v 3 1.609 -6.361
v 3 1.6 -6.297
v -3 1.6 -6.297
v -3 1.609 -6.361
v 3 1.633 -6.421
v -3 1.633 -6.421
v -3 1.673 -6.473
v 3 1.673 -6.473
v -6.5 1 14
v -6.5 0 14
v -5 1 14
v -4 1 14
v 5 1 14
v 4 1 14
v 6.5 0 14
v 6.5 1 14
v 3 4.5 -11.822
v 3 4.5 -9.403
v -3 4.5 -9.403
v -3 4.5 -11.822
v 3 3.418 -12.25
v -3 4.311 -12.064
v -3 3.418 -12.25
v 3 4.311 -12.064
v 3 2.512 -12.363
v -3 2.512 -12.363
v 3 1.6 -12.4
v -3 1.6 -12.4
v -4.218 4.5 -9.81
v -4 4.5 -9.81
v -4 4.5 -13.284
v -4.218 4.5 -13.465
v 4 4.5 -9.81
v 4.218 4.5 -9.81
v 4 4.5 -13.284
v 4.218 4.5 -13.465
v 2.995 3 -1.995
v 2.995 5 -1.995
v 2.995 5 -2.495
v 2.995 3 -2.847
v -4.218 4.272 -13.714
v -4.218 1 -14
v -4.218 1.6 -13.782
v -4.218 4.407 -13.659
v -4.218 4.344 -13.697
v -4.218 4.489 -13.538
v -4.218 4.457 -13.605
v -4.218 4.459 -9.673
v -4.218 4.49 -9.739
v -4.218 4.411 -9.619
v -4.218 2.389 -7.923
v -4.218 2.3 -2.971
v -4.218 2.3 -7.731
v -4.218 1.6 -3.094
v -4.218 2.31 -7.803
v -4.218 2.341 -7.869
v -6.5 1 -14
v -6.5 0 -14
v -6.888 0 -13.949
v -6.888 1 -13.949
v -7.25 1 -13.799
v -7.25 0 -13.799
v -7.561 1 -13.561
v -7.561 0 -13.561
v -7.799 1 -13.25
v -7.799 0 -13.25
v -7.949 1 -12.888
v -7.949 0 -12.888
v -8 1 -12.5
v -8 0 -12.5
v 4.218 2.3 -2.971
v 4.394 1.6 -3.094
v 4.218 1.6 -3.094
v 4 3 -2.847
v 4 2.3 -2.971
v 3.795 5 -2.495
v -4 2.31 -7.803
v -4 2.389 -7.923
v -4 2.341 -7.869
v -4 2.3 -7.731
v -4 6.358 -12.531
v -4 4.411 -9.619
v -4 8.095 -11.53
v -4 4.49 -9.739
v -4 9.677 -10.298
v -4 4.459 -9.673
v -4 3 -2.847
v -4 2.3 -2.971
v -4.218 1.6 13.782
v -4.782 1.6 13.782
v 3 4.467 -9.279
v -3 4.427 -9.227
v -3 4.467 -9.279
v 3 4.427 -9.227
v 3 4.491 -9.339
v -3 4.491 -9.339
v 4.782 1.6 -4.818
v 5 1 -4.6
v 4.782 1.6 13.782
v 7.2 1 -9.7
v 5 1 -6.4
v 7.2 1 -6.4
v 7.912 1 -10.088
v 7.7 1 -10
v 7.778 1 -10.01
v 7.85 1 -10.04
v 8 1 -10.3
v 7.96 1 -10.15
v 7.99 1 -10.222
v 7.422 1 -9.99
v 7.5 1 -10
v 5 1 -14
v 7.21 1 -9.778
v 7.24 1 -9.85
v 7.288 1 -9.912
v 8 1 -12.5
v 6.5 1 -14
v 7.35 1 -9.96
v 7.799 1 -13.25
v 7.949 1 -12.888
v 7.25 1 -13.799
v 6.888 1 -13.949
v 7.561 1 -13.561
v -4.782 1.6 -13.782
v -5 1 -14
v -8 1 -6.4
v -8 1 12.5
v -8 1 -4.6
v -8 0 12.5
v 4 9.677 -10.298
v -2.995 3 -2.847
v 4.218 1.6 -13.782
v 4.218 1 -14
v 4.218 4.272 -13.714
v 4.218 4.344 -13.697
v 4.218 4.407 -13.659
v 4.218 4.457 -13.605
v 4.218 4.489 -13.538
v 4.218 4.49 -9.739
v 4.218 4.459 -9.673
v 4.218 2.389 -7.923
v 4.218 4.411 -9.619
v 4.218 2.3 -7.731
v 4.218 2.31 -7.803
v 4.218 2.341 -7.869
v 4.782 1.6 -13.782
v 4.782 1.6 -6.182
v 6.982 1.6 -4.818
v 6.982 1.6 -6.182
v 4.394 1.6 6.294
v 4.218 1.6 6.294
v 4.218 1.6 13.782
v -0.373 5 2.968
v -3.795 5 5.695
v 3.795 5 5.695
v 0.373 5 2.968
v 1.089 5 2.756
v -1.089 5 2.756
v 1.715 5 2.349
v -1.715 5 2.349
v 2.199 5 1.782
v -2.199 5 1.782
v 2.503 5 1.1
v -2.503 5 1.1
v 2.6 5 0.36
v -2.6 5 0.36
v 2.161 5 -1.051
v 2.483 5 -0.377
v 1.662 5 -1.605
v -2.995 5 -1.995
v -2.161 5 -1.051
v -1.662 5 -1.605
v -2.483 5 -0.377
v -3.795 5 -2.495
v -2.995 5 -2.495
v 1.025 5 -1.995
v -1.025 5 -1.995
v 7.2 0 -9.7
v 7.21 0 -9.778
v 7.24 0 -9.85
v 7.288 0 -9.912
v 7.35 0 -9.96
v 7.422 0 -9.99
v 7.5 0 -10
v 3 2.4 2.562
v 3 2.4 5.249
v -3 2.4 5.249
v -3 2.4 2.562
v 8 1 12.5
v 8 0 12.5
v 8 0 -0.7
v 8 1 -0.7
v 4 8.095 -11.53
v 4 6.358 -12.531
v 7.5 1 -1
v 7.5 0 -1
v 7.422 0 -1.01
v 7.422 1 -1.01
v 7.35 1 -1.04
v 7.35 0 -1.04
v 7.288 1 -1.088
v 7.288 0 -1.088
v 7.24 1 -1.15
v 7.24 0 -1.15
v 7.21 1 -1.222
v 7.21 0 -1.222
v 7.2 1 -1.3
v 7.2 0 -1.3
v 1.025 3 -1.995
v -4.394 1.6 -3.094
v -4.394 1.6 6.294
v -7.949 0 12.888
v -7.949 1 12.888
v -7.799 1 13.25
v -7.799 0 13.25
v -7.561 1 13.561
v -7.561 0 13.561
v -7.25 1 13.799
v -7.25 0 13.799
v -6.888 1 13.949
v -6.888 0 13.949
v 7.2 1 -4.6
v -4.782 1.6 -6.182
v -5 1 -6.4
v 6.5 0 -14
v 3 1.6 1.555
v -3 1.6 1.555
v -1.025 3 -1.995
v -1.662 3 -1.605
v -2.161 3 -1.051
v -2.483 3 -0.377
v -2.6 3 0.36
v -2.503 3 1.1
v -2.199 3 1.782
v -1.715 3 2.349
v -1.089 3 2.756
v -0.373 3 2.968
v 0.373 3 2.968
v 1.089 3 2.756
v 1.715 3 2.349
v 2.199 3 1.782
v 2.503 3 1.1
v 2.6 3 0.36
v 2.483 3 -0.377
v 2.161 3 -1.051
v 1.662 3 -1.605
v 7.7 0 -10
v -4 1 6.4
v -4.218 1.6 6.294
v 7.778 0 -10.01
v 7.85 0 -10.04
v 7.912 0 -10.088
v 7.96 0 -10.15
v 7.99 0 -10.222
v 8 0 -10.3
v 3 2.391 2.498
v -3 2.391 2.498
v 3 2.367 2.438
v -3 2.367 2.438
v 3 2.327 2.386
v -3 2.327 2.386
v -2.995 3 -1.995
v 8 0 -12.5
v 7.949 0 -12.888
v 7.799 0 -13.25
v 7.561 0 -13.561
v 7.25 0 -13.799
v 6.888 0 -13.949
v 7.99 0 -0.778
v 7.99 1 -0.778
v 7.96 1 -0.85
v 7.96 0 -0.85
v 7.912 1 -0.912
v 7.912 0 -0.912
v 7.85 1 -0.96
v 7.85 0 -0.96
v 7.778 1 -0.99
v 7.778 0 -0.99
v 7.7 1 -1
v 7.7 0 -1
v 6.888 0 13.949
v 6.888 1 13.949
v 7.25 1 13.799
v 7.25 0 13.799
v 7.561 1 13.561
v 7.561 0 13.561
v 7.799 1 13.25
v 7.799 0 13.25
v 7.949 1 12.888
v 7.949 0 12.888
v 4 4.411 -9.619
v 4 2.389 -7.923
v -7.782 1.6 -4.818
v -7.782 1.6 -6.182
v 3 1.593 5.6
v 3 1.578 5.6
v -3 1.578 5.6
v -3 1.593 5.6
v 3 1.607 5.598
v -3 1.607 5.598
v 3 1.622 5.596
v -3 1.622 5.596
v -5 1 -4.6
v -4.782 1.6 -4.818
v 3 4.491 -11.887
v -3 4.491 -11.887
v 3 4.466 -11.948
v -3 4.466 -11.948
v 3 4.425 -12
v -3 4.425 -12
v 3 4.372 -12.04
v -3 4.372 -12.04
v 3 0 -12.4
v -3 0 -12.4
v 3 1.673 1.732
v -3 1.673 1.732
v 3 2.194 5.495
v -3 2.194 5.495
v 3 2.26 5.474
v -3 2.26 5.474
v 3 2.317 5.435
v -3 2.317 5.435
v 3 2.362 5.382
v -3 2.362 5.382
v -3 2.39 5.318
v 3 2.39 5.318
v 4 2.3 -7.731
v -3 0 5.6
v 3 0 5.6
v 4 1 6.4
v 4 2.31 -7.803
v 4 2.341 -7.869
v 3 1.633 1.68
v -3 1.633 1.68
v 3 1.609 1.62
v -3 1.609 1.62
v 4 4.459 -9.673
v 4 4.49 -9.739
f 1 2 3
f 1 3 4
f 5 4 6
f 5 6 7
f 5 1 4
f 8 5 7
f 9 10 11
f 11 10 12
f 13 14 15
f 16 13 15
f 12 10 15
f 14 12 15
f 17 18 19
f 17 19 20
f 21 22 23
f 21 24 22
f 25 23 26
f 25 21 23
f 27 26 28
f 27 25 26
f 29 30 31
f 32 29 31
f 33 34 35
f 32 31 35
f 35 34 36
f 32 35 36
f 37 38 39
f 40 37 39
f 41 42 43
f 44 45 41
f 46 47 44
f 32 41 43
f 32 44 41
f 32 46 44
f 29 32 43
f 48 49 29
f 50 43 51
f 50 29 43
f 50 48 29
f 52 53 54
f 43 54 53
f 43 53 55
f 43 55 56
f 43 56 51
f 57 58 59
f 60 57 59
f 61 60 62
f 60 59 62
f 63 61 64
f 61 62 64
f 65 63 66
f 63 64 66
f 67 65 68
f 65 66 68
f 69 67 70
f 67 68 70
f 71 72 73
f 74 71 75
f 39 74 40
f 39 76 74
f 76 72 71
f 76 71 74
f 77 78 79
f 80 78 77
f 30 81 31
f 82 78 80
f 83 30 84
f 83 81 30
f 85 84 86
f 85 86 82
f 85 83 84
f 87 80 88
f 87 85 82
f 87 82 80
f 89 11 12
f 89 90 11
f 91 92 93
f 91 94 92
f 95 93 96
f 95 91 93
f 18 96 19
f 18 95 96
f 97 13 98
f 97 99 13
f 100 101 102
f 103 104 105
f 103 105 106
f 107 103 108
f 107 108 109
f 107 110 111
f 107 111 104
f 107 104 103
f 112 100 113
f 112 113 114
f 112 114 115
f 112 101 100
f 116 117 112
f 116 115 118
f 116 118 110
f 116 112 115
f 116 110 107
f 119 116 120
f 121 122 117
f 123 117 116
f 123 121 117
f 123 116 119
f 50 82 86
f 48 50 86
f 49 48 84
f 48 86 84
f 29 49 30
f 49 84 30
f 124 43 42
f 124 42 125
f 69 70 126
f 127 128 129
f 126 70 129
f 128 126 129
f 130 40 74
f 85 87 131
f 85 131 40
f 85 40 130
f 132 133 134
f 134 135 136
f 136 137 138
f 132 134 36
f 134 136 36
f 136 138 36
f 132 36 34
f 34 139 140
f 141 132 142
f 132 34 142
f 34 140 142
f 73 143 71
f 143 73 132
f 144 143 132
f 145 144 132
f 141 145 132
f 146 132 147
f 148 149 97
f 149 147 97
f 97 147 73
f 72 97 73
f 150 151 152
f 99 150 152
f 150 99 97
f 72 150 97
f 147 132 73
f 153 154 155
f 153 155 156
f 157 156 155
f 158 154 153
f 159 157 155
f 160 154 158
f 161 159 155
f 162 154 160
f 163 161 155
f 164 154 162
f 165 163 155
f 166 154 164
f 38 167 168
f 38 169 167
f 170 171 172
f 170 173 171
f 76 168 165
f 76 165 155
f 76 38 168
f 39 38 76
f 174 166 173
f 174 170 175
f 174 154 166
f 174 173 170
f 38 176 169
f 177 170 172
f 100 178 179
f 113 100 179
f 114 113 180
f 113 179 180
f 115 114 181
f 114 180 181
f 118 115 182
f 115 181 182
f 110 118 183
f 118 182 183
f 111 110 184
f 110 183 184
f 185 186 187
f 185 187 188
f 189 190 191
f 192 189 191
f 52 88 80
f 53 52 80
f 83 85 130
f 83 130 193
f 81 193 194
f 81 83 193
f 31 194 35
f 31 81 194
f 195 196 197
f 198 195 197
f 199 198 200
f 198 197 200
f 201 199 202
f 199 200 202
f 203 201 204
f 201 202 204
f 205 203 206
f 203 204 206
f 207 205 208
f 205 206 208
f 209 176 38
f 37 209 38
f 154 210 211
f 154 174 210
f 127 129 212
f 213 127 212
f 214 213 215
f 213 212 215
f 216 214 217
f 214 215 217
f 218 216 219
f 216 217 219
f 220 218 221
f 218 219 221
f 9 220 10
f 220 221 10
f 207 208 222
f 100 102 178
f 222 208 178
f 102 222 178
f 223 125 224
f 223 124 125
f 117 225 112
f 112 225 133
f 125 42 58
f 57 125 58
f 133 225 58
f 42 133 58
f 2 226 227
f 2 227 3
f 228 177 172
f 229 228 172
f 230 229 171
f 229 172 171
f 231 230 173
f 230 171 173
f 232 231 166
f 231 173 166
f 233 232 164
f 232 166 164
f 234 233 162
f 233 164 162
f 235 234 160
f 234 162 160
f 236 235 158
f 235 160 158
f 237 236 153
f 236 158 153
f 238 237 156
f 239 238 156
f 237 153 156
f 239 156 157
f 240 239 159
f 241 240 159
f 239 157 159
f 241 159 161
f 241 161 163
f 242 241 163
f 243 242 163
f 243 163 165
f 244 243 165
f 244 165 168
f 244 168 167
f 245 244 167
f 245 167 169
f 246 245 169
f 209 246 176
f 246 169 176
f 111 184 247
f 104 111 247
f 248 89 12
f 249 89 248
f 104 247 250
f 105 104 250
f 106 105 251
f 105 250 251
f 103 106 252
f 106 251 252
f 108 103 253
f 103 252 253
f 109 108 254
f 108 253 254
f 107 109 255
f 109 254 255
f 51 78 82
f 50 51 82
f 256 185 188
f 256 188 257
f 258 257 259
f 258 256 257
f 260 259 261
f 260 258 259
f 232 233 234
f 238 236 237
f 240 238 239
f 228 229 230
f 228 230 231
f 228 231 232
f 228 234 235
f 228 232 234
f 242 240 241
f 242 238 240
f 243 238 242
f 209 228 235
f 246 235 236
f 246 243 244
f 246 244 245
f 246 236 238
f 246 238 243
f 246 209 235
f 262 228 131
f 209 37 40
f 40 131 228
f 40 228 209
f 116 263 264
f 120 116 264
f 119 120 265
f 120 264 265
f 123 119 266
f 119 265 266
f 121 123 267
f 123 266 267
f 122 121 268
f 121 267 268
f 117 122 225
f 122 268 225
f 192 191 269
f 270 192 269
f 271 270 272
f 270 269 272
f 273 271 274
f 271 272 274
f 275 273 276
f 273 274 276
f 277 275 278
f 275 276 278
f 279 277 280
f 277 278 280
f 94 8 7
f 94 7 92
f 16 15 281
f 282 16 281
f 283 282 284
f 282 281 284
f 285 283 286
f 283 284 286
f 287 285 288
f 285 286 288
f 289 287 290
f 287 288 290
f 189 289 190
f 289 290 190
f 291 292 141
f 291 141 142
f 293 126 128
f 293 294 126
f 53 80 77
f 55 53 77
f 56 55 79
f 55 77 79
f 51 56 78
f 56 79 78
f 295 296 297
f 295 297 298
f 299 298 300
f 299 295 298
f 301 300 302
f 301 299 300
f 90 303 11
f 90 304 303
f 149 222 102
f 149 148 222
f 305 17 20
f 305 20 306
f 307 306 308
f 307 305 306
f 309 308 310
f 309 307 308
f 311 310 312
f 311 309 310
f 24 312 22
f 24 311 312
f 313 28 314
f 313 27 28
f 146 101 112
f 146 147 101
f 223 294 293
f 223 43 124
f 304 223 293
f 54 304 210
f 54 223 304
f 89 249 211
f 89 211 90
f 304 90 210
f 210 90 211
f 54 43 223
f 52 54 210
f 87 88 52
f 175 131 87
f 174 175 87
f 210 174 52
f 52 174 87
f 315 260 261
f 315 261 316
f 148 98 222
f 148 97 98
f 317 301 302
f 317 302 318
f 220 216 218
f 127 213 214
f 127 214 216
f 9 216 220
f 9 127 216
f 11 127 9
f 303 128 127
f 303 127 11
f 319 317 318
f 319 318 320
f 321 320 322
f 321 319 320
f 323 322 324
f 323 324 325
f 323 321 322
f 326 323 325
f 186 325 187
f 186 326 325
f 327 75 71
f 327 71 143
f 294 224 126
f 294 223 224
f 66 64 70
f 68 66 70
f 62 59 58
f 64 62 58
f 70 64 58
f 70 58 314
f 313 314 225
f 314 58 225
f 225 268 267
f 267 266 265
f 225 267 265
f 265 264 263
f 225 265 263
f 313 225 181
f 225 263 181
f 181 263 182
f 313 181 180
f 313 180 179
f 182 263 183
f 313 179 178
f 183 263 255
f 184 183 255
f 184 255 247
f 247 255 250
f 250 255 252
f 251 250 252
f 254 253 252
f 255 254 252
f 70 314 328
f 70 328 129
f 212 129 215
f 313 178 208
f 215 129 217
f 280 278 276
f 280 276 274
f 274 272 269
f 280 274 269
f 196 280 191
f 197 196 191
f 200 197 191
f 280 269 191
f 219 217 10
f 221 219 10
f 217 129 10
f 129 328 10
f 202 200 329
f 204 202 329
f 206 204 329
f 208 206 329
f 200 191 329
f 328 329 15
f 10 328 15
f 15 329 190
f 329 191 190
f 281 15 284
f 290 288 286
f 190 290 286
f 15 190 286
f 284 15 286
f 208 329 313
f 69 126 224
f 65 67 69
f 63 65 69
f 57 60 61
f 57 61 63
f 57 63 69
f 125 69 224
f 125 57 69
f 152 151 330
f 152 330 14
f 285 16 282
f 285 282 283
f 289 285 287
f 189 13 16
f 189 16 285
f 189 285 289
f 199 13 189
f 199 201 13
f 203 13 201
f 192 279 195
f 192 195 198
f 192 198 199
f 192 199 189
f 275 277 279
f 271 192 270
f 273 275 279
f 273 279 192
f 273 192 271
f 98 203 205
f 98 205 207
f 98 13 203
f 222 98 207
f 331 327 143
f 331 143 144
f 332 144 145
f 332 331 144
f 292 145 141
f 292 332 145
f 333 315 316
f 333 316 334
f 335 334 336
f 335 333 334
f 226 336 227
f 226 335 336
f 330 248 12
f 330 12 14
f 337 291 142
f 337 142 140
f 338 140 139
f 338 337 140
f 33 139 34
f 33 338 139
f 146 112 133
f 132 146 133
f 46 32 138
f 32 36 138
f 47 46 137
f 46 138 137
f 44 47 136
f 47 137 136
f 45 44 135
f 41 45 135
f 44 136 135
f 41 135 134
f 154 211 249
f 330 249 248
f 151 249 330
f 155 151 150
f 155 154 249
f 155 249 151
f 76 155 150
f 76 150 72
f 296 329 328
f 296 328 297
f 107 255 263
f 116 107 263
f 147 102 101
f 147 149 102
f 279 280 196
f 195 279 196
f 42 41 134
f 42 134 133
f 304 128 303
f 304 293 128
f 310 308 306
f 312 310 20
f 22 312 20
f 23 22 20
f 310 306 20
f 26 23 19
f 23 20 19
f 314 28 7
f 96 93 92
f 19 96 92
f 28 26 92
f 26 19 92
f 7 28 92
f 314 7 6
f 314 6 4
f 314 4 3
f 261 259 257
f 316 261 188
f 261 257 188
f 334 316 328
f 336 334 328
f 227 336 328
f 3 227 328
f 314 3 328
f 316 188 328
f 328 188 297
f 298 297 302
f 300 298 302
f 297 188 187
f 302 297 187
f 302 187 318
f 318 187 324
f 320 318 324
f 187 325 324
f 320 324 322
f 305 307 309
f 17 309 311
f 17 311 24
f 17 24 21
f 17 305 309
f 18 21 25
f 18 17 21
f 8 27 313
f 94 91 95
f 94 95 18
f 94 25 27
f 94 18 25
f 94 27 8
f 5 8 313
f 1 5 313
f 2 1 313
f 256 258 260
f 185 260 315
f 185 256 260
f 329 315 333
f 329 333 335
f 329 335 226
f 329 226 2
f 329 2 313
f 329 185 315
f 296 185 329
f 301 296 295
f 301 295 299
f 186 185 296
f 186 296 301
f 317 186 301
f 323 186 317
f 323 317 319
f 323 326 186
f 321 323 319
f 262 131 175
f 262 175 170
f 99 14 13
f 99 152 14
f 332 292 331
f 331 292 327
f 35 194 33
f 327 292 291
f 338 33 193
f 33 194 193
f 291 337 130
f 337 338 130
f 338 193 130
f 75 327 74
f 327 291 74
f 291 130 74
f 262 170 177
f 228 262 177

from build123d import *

# Parameters (mm, degrees)
BOSS_EXTRUDE1_DEPTH      = 1
BOSS_EXTRUDE2_DEPTH      = 0.6
BOSS_EXTRUDE2_TAPER      = 20
SKETCH4_W                = 9
SKETCH4_H                = 9.6
BOSS_EXTRUDE3_DEPTH      = 4
BOSS_EXTRUDE3_TAPER      = 10
CUT_EXTRUDE1_DEPTH       = 2
BOSS_EXTRUDE4_DEPTH      = 4
BOSS_EXTRUDE4_DEPTH_BACK = 4
BOSS_EXTRUDE5_DEPTH      = 4.218382
BOSS_EXTRUDE5_DEPTH_BACK = 4.218382
CUT_EXTRUDE2_DEPTH       = 3
CUT_EXTRUDE2_DEPTH_BACK  = 3


with BuildPart() as part:
    # Sketch1 → Boss-Extrude1 (new body)
    with BuildSketch(Plane(origin=(0, 0, 0), x_dir=(1, 0, 0), z_dir=(0, 1, 0))):
        with BuildLine():
            Line((8, 10.3), (8, 12.5))
            ThreePointArc((8, 12.5), (7.560660172, 13.560660172), (6.5, 14))
            Line((6.5, 14), (-6.5, 14))
            ThreePointArc((-6.5, 14), (-7.560660172, 13.560660172), (-8, 12.5))
            Line((-8, 12.5), (-8, -12.5))
            ThreePointArc((-8, -12.5), (-7.560660172, -13.560660172), (-6.5, -14))
            Line((-6.5, -14), (6.5, -14))
            ThreePointArc((6.5, -14), (7.560660172, -13.560660172), (8, -12.5))
            Line((8, -12.5), (8, 0.7))
            ThreePointArc((8, 0.7), (7.912132034, 0.912132034), (7.7, 1))
            Line((7.7, 1), (7.5, 1))
            ThreePointArc((7.5, 1), (7.287867966, 1.087867966), (7.2, 1.3))
            Line((7.2, 1.3), (7.2, 9.7))
            ThreePointArc((7.2, 9.7), (7.287867966, 9.912132034), (7.5, 10))
            Line((7.5, 10), (7.7, 10))
            ThreePointArc((7.7, 10), (7.912132034, 10.087867966), (8, 10.3))
        make_face()
    extrude(amount=BOSS_EXTRUDE1_DEPTH)

    # Sketch2 → Boss-Extrude2 (add)
    with BuildSketch(Plane(origin=(0, 1, 0), x_dir=(1, 0, 0), z_dir=(0, 1, 0))):
        Polygon((-8, 4.6), (-5, 4.6), (-5, -14), (-4, -14), (-4, 4.6), (-4, 6.4), (-4, 14), (-5, 14), (-5, 6.4), (-8, 6.4), align=None)
        Polygon((7.2, 4.6), (7.2, 6.4), (5, 6.4), (5, 14), (4, 14), (4, 6.4), (4, 4.6), (4, -14), (5, -14), (5, 4.6), align=None)
    extrude(amount=BOSS_EXTRUDE2_DEPTH, taper=BOSS_EXTRUDE2_TAPER)

    # Sketch4 → Boss-Extrude3 (add)
    with BuildSketch(Plane(origin=(0, 1, 0), x_dir=(1, 0, 0), z_dir=(0, 1, 0))):
        with Locations((0, -1.6)):
            Rectangle(SKETCH4_W, SKETCH4_H)
    extrude(amount=BOSS_EXTRUDE3_DEPTH, taper=BOSS_EXTRUDE3_TAPER)

    # Sketch5 → Cut-Extrude1 (cut)
    with BuildSketch(Plane(origin=(0, 5, 0), x_dir=(1, 0, 0), z_dir=(0, 1, 0))):
        with BuildLine():
            Line((-2.994692077, 1.994692077), (-1.025106513, 1.994692077))
            ThreePointArc((-1.025106513, 1.994692077), (0, -2.994692077), (1.025106513, 1.994692077))
            Line((1.025106513, 1.994692077), (2.994692077, 1.994692077))
            Line((2.994692077, 1.994692077), (2.994692077, 2.494692077))
            Line((2.994692077, 2.494692077), (2.994692077, 3.2))
            Line((2.994692077, 3.2), (-2.994692077, 3.2))
            Line((-2.994692077, 3.2), (-2.994692077, 2.494692077))
            Line((-2.994692077, 2.494692077), (-2.994692077, 1.994692077))
        make_face()
    extrude(amount=-CUT_EXTRUDE1_DEPTH, mode=Mode.SUBTRACT)

    # Sketch6 → Boss-Extrude4 (add, two sides)
    with BuildSketch(Plane(origin=(0, 0, 0), x_dir=(0, 0, -1), z_dir=(1, 0, 0))) as boss_extrude4_sk:
        with BuildLine():
            Line((-0.5, 0), (10.297970476, 9.67749108))
            ThreePointArc((10.297970476, 9.67749108), (13.042905373, 5.180705941), (14, 0))
            Line((14, 0), (-0.5, 0))
        make_face()
    extrude(amount=BOSS_EXTRUDE4_DEPTH)
    extrude(boss_extrude4_sk.sketch, amount=-BOSS_EXTRUDE4_DEPTH_BACK)

    # Sketch7 → Boss-Extrude5 (add, two sides)
    with BuildSketch(Plane(origin=(0, 0, 0), x_dir=(0, 0, -1), z_dir=(1, 0, 0))) as boss_extrude5_sk:
        with BuildLine():
            Line((2.970774925, 2.3), (7.731260017, 2.3))
            ThreePointArc((7.731260017, 2.3), (7.836854365, 2.323409703), (7.922661977, 2.3892522))
            Line((7.922661977, 2.3892522), (9.61889819, 4.4107478))
            ThreePointArc((9.61889819, 4.4107478), (9.704705802, 4.476590297), (9.81030015, 4.5))
            Line((9.81030015, 4.5), (13.464837448, 4.5))
            ThreePointArc((13.464837448, 4.5), (13.633638738, 4.434356768), (13.713744179, 4.271919003))
            Line((13.713744179, 4.271919003), (14, 1))
            Line((14, 1), (3.2, 1))
            Line((3.2, 1), (2.970774925, 2.3))
        make_face()
    extrude(amount=BOSS_EXTRUDE5_DEPTH)
    extrude(boss_extrude5_sk.sketch, amount=-BOSS_EXTRUDE5_DEPTH_BACK)

    # Sketch9 → Cut-Extrude2 (cut, two sides)
    with BuildSketch(Plane(origin=(0, 0, 0), x_dir=(0, 0, -1), z_dir=(1, 0, 0))) as cut_extrude2_sk:
        with BuildLine():
            ThreePointArc((9.226818428, 4.426818428), (9.30787804, 4.480980729), (9.403494371, 4.5))
            Line((9.403494371, 4.5), (11.8219778, 4.5))
            ThreePointArc((11.8219778, 4.5), (11.97560279, 4.447191058), (12.064288583, 4.311087229))
            ThreePointArc((12.064288583, 4.311087229), (12.315752859, 2.965896786), (12.4, 1.6))
            Line((12.4, 1.6), (12.4, 0))
            Line((12.4, 0), (-5.6, 0))
            Line((-5.6, 0), (-5.6, 1.5781403))
            ThreePointArc((-5.6, 1.5781403), (-5.599049217, 1.599916817), (-5.596204103, 1.621527602))
            Line((-5.596204103, 1.621527602), (-5.495344685, 2.193529787))
            ThreePointArc((-5.495344685, 2.193529787), (-5.409888382, 2.341544446), (-5.249283067, 2.4))
            Line((-5.249283067, 2.4), (-2.562432787, 2.4))
            ThreePointArc((-2.562432787, 2.4), (-2.466816455, 2.380980729), (-2.385756844, 2.326818428))
            Line((-2.385756844, 2.326818428), (-1.732119987, 1.673181572))
            ThreePointArc((-1.732119987, 1.673181572), (-1.651060376, 1.619019271), (-1.555444044, 1.6))
            Line((-1.555444044, 1.6), (6.296505629, 1.6))
            ThreePointArc((6.296505629, 1.6), (6.39212196, 1.619019271), (6.473181572, 1.673181572))
            Line((6.473181572, 1.673181572), (9.226818428, 4.426818428))
        make_face()
    extrude(amount=CUT_EXTRUDE2_DEPTH, mode=Mode.SUBTRACT)
    extrude(cut_extrude2_sk.sketch, amount=-CUT_EXTRUDE2_DEPTH_BACK, mode=Mode.SUBTRACT)


solid = part.part
